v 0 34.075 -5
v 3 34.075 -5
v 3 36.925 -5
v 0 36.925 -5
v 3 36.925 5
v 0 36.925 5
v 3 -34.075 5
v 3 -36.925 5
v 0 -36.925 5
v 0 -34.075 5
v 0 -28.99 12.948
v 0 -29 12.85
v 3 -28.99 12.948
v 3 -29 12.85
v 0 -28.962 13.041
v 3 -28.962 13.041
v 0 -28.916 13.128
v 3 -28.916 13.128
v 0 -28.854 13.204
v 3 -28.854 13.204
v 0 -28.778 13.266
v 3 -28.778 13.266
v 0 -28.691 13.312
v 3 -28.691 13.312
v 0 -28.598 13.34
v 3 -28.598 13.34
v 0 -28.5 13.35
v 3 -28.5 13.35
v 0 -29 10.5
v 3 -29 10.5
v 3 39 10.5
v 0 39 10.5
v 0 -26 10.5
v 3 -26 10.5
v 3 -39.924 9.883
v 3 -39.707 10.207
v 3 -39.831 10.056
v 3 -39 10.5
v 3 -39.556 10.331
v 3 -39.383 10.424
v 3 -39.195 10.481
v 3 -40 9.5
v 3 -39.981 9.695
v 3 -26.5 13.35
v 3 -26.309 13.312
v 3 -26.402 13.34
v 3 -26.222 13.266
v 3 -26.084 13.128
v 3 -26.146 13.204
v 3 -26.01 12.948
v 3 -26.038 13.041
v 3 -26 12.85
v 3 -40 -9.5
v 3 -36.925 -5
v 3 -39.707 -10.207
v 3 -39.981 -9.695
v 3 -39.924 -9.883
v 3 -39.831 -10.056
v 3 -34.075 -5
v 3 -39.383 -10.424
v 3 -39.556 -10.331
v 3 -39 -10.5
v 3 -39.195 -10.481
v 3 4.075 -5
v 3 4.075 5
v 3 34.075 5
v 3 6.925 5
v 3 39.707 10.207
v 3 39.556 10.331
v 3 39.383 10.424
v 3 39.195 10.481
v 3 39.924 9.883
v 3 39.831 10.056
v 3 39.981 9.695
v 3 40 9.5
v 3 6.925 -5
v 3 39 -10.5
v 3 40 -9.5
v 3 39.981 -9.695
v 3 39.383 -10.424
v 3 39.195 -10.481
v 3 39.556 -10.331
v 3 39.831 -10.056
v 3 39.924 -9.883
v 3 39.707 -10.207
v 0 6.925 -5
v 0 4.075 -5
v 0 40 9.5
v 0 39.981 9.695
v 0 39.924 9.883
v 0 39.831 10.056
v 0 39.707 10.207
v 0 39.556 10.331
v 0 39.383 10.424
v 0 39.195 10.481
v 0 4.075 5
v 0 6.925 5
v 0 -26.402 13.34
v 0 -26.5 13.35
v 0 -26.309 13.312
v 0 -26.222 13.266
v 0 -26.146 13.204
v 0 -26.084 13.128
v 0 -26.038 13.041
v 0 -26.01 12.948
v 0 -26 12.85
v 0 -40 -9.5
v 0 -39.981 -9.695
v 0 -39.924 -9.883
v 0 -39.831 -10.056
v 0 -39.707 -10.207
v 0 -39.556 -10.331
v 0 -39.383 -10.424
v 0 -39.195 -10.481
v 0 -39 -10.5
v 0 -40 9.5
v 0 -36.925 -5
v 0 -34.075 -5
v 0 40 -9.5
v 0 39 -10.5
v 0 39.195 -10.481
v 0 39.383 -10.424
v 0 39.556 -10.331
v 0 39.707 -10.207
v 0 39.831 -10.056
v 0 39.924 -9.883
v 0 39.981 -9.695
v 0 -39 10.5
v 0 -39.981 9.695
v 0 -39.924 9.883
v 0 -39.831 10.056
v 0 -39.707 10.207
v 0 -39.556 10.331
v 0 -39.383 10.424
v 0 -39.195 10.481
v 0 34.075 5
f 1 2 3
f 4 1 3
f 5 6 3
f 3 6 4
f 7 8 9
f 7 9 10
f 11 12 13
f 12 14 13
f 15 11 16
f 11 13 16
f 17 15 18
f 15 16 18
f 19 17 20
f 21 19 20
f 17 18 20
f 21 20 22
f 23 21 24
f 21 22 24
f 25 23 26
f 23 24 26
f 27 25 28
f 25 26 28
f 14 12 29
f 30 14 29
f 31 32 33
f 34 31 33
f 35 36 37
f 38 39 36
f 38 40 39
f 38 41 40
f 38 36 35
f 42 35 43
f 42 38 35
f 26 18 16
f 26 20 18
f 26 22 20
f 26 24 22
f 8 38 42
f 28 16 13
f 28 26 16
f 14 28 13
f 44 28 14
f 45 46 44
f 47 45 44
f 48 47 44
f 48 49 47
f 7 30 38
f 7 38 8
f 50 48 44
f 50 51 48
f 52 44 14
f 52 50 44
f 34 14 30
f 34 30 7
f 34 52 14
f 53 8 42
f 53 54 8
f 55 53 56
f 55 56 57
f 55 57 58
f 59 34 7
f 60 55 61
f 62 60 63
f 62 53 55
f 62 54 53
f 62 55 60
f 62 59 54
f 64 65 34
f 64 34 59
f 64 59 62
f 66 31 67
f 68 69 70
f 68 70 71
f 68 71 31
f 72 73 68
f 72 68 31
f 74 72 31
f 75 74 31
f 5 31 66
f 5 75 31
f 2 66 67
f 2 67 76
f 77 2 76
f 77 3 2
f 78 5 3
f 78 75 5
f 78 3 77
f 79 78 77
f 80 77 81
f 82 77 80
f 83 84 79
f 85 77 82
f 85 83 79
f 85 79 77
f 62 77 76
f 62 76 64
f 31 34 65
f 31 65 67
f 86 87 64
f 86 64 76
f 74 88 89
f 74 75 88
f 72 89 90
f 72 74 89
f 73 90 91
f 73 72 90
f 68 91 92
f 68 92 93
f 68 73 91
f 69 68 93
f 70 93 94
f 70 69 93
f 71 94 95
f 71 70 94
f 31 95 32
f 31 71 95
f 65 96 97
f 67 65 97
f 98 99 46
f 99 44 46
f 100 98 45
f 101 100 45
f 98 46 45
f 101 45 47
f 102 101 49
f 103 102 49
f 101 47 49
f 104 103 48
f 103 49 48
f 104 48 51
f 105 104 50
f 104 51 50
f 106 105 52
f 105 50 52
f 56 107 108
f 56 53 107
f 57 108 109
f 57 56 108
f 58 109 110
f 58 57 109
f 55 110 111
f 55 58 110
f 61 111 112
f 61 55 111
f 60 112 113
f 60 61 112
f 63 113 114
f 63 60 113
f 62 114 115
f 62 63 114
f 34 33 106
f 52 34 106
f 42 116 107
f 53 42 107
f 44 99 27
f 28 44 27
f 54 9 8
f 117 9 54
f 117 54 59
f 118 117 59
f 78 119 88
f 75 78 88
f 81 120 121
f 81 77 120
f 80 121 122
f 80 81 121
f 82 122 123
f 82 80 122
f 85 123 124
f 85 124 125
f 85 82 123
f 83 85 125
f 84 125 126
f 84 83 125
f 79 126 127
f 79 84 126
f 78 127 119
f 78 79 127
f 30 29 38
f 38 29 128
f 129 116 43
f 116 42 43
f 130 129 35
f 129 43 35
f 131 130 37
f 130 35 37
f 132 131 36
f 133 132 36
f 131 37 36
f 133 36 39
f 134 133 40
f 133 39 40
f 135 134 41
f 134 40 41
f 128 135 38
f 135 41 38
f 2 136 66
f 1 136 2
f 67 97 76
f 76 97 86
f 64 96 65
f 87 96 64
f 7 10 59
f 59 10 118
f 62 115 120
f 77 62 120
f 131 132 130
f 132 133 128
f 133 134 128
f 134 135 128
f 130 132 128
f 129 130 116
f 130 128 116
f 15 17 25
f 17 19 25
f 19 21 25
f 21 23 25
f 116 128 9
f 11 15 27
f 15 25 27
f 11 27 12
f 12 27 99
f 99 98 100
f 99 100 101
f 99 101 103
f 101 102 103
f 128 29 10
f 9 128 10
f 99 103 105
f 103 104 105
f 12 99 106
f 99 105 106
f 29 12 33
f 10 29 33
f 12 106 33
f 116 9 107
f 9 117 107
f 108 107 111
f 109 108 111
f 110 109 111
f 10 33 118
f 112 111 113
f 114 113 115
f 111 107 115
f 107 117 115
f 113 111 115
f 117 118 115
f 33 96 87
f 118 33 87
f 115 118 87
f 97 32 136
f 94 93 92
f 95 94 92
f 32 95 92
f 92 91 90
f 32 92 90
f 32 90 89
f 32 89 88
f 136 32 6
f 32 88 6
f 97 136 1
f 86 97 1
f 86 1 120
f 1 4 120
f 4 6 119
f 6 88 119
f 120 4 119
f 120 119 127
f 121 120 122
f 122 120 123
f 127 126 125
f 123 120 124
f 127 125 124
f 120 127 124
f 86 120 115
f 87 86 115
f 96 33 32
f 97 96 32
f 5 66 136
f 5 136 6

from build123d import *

# Parameters (mm, degrees)
SKETCH_1_W      = 10
SKETCH_1_H      = 2.85
EXTRUDE_1_DEPTH = 3
FILLET_1_R      = 1
FILLET_2_R      = 0.5


with BuildPart() as part:
    # Эскиз1 → Бобышка-Вытянуть1 (new body)
    with BuildSketch(Plane(origin=(0, 0, 0), x_dir=(0, 0, -1), z_dir=(1, 0, 0))):
        Polygon((-10.5, -40), (10.5, -40), (10.5, 40), (-10.5, 40), (-10.5, -26), (-13.35, -26), (-13.35, -29), (-10.5, -29), align=None)
        with Locations((0, 5.5)):
            Rectangle(SKETCH_1_W, SKETCH_1_H, mode=Mode.SUBTRACT)
        with Locations((0, -35.5)):
            Rectangle(SKETCH_1_W, SKETCH_1_H, mode=Mode.SUBTRACT)
        with Locations((0, 35.5)):
            Rectangle(SKETCH_1_W, SKETCH_1_H, mode=Mode.SUBTRACT)
    extrude(amount=EXTRUDE_1_DEPTH)

    # Скругление1
    fillet_1_edges = [part.edges().sort_by_distance(p)[0] for p in [
        (1.5, -40, -10.5),
        (1.5, -40, 10.5),
        (1.5, 40, 10.5),
        (1.5, 40, -10.5),
    ]]
    fillet(fillet_1_edges, radius=FILLET_1_R)

    # Скругление2
    fillet_2_edges = [part.edges().sort_by_distance(p)[0] for p in [
        (1.5, -29, 13.35),
        (1.5, -26, 13.35),
    ]]
    fillet(fillet_2_edges, radius=FILLET_2_R)


solid = part.part
